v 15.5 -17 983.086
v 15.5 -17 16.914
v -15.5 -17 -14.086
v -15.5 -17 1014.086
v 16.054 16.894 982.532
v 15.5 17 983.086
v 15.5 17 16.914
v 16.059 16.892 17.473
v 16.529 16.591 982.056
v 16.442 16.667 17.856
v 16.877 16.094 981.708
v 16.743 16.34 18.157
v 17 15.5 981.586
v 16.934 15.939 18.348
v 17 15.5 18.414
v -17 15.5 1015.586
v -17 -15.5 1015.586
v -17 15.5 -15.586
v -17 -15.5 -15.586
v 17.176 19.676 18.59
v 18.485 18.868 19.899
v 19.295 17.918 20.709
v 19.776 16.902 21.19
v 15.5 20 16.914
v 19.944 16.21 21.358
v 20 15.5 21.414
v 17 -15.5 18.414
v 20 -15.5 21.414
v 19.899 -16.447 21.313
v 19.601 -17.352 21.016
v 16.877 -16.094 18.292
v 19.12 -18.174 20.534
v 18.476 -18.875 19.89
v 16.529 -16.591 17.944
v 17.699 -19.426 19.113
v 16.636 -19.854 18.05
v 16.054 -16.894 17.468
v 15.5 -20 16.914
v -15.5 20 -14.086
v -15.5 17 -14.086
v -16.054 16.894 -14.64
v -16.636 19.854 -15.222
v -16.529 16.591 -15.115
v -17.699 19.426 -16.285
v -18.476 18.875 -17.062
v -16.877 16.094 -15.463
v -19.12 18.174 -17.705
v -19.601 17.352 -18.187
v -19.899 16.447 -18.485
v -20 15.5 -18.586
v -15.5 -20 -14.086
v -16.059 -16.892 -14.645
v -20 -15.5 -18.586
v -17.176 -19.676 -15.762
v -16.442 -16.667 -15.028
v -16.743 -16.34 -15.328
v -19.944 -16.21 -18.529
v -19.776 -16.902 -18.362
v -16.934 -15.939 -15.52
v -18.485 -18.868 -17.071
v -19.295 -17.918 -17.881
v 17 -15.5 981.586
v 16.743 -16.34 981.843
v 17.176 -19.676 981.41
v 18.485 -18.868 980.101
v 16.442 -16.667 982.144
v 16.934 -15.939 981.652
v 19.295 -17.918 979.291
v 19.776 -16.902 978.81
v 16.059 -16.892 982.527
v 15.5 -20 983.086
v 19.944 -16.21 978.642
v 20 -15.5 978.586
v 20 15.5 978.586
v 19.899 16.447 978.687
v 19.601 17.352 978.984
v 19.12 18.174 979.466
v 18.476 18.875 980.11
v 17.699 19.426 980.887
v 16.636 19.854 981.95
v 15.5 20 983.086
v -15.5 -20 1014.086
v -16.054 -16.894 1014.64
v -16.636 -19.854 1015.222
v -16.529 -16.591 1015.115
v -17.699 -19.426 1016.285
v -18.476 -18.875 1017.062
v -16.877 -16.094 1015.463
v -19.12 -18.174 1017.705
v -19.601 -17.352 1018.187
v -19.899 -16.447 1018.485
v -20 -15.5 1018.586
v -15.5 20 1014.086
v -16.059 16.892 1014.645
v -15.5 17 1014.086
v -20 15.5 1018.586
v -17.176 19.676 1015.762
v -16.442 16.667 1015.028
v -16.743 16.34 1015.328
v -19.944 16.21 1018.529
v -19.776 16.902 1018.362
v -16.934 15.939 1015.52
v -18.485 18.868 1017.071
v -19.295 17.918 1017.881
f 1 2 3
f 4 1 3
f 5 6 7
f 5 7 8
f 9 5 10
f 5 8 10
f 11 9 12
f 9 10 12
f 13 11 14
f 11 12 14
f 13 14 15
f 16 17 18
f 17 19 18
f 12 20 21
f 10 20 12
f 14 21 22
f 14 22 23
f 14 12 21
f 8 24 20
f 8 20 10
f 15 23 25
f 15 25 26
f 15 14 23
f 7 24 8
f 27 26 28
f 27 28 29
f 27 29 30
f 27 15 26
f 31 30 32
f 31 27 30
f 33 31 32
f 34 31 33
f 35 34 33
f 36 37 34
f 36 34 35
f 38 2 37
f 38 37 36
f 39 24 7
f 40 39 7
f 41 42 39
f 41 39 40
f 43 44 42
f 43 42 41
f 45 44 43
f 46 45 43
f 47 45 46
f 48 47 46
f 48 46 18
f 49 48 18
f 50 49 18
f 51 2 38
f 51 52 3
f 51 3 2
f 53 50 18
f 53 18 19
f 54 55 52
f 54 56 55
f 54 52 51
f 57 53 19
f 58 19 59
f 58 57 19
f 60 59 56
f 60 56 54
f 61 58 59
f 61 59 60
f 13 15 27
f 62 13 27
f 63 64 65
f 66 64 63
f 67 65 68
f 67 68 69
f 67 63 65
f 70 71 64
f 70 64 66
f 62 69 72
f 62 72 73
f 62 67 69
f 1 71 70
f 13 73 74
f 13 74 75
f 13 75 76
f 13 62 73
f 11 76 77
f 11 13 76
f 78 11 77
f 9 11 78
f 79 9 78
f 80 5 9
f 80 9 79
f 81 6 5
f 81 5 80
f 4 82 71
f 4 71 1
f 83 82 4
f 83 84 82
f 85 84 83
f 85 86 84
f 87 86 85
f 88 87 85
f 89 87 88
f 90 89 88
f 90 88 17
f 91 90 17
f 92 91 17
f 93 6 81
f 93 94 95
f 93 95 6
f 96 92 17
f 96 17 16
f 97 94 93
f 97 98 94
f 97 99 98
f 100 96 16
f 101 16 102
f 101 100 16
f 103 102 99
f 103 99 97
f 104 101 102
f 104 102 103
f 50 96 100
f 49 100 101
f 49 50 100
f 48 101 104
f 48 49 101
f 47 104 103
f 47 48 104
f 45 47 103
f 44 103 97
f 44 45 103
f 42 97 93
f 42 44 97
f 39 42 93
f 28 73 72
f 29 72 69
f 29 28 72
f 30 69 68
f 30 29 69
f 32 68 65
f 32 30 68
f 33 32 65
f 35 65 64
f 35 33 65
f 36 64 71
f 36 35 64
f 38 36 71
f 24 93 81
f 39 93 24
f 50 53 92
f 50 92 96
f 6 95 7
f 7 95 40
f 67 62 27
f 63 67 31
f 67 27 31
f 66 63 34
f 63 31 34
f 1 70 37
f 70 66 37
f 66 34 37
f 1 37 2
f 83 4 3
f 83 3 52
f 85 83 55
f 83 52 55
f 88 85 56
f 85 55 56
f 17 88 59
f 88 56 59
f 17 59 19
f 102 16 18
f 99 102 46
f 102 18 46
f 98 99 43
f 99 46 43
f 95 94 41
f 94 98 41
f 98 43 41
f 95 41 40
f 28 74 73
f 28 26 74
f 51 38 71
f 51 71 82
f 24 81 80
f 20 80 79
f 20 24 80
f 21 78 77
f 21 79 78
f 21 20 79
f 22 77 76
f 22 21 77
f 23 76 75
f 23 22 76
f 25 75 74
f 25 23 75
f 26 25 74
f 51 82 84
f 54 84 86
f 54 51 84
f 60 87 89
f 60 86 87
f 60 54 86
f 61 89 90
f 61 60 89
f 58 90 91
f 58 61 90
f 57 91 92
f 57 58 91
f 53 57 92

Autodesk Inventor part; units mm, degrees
ref_plane "Start Plane" through (0, 0, -18.5858) normal (0, 0, 1) x (1, 0, 0)
ref_plane "End Plane" through (0, 0, 1018.5858) normal (0, 0, 1) x (1, 0, 0)
sketch "Sketch" plane through (0, 0, 0) normal (0, 0, 1) x (1, 0, 0)
  line L0 (-20, -15.5) -> (-20, 15.5)
  line L1 (-15.5, 20) -> (15.5, 20)
  line L2 (20, 15.5) -> (20, -15.5)
  line L3 (15.5, -20) -> (-15.5, -20)
  arc A0 (-20, -15.5) -> (-15.5, -20) centre (-15.5, -15.5) ccw
  arc A1 (-15.5, 20) -> (-20, 15.5) centre (-15.5, 15.5) ccw
  arc A2 (20, 15.5) -> (15.5, 20) centre (15.5, 15.5) ccw
  arc A3 (15.5, -20) -> (20, -15.5) centre (15.5, -15.5) ccw
  arc A4 (-15.5, 17) -> (-17, 15.5) centre (-15.5, 15.5) ccw
  line L4 (-15.5, 17) -> (15.5, 17)
  arc A5 (17, 15.5) -> (15.5, 17) centre (15.5, 15.5) ccw
  line L5 (17, 15.5) -> (17, -15.5)
  arc A6 (15.5, -17) -> (17, -15.5) centre (15.5, -15.5) ccw
  line L6 (15.5, -17) -> (-15.5, -17)
  arc A7 (-17, -15.5) -> (-15.5, -17) centre (-15.5, -15.5) ccw
  line L7 (-17, -15.5) -> (-17, 15.5)
  line L8 (0, 29.3048) -> (0, -29.3048) construction
  line L9 (-29.3048, 0) -> (29.3048, 0) construction
  dimension "d7" = 4.5
  dimension "d10" = 40
  dimension "d11" = 40
  dimension "d12" = 3
  dimension "d15" = 20
  dimension "d16" = 20
extrude "Body" add sketch "Sketch" along normal up to surface (1037.1716 mm away) from surface at -18.5858
sketch "Sketch3" plane through (0, 0, 0) normal (0, 0, 1) x (1, 0, 0)
  line L0 (0, 0) -> (10, 0)
ref_plane "Work Plane3" through (0, 0, 0) normal (0, -1, 0) x (1, 0, 0)
ref_plane "Work Plane5" through (-20.7071, 0, -19.2929) normal (0.7071, 0, -0.7071) x (-0.7071, 0, -0.7071)
split "Split2" plane through (-20.7071, 0, -19.2929) removes the side toward (0.7071, 0, -0.7071)
ref_plane "Work Plane8" through (-20.7071, 0, 1019.2929) normal (0.7071, 0, 0.7071) x (0.7071, 0, -0.7071)
split "Split5" plane through (-20.7071, 0, 1019.2929) removes the side toward (0.7071, 0, 0.7071)
sketch "Sketch4" plane through (0, 0, 0) normal (0, -1, 0) x (1, 0, 0)
  line L0 (-2, -18.5858) -> (12, -18.5858) projected
  line L1 (-2, 1018.5858) -> (12, 1018.5858) projected
  dimension "d18" = 1037.1716
equation "\"d7\" = G_IR"
equation "\"d10\" = G_H"
equation "\"d11\" = G_W"
equation "\"d12\" = G_T"
equation "\"d15\" = 0.5 * d10"
equation "\"d16\" = 0.5 * d11"
equation "\"d3\" = G_L"
equation "\"G_W\" = 40"
equation "\"G_H\" = 40"
equation "\"G_T\" = 3"
equation "\"G_IR\" = 4.5"
equation "\"G_L\" = d18"
equation "\"G_OFFSET_START\" = 18.58579"
equation "\"G_OFFSET_END\" = 18.58579"
equation "\"d13\" = -G_OFFSET_START"
equation "\"d14\" = G_OFFSET_END + B_L"
equation "\"B_L\" = 1000"
properties part number "ISO 12633-2 - 40x40x3 - 1037,17" material "Steel, Mild"
